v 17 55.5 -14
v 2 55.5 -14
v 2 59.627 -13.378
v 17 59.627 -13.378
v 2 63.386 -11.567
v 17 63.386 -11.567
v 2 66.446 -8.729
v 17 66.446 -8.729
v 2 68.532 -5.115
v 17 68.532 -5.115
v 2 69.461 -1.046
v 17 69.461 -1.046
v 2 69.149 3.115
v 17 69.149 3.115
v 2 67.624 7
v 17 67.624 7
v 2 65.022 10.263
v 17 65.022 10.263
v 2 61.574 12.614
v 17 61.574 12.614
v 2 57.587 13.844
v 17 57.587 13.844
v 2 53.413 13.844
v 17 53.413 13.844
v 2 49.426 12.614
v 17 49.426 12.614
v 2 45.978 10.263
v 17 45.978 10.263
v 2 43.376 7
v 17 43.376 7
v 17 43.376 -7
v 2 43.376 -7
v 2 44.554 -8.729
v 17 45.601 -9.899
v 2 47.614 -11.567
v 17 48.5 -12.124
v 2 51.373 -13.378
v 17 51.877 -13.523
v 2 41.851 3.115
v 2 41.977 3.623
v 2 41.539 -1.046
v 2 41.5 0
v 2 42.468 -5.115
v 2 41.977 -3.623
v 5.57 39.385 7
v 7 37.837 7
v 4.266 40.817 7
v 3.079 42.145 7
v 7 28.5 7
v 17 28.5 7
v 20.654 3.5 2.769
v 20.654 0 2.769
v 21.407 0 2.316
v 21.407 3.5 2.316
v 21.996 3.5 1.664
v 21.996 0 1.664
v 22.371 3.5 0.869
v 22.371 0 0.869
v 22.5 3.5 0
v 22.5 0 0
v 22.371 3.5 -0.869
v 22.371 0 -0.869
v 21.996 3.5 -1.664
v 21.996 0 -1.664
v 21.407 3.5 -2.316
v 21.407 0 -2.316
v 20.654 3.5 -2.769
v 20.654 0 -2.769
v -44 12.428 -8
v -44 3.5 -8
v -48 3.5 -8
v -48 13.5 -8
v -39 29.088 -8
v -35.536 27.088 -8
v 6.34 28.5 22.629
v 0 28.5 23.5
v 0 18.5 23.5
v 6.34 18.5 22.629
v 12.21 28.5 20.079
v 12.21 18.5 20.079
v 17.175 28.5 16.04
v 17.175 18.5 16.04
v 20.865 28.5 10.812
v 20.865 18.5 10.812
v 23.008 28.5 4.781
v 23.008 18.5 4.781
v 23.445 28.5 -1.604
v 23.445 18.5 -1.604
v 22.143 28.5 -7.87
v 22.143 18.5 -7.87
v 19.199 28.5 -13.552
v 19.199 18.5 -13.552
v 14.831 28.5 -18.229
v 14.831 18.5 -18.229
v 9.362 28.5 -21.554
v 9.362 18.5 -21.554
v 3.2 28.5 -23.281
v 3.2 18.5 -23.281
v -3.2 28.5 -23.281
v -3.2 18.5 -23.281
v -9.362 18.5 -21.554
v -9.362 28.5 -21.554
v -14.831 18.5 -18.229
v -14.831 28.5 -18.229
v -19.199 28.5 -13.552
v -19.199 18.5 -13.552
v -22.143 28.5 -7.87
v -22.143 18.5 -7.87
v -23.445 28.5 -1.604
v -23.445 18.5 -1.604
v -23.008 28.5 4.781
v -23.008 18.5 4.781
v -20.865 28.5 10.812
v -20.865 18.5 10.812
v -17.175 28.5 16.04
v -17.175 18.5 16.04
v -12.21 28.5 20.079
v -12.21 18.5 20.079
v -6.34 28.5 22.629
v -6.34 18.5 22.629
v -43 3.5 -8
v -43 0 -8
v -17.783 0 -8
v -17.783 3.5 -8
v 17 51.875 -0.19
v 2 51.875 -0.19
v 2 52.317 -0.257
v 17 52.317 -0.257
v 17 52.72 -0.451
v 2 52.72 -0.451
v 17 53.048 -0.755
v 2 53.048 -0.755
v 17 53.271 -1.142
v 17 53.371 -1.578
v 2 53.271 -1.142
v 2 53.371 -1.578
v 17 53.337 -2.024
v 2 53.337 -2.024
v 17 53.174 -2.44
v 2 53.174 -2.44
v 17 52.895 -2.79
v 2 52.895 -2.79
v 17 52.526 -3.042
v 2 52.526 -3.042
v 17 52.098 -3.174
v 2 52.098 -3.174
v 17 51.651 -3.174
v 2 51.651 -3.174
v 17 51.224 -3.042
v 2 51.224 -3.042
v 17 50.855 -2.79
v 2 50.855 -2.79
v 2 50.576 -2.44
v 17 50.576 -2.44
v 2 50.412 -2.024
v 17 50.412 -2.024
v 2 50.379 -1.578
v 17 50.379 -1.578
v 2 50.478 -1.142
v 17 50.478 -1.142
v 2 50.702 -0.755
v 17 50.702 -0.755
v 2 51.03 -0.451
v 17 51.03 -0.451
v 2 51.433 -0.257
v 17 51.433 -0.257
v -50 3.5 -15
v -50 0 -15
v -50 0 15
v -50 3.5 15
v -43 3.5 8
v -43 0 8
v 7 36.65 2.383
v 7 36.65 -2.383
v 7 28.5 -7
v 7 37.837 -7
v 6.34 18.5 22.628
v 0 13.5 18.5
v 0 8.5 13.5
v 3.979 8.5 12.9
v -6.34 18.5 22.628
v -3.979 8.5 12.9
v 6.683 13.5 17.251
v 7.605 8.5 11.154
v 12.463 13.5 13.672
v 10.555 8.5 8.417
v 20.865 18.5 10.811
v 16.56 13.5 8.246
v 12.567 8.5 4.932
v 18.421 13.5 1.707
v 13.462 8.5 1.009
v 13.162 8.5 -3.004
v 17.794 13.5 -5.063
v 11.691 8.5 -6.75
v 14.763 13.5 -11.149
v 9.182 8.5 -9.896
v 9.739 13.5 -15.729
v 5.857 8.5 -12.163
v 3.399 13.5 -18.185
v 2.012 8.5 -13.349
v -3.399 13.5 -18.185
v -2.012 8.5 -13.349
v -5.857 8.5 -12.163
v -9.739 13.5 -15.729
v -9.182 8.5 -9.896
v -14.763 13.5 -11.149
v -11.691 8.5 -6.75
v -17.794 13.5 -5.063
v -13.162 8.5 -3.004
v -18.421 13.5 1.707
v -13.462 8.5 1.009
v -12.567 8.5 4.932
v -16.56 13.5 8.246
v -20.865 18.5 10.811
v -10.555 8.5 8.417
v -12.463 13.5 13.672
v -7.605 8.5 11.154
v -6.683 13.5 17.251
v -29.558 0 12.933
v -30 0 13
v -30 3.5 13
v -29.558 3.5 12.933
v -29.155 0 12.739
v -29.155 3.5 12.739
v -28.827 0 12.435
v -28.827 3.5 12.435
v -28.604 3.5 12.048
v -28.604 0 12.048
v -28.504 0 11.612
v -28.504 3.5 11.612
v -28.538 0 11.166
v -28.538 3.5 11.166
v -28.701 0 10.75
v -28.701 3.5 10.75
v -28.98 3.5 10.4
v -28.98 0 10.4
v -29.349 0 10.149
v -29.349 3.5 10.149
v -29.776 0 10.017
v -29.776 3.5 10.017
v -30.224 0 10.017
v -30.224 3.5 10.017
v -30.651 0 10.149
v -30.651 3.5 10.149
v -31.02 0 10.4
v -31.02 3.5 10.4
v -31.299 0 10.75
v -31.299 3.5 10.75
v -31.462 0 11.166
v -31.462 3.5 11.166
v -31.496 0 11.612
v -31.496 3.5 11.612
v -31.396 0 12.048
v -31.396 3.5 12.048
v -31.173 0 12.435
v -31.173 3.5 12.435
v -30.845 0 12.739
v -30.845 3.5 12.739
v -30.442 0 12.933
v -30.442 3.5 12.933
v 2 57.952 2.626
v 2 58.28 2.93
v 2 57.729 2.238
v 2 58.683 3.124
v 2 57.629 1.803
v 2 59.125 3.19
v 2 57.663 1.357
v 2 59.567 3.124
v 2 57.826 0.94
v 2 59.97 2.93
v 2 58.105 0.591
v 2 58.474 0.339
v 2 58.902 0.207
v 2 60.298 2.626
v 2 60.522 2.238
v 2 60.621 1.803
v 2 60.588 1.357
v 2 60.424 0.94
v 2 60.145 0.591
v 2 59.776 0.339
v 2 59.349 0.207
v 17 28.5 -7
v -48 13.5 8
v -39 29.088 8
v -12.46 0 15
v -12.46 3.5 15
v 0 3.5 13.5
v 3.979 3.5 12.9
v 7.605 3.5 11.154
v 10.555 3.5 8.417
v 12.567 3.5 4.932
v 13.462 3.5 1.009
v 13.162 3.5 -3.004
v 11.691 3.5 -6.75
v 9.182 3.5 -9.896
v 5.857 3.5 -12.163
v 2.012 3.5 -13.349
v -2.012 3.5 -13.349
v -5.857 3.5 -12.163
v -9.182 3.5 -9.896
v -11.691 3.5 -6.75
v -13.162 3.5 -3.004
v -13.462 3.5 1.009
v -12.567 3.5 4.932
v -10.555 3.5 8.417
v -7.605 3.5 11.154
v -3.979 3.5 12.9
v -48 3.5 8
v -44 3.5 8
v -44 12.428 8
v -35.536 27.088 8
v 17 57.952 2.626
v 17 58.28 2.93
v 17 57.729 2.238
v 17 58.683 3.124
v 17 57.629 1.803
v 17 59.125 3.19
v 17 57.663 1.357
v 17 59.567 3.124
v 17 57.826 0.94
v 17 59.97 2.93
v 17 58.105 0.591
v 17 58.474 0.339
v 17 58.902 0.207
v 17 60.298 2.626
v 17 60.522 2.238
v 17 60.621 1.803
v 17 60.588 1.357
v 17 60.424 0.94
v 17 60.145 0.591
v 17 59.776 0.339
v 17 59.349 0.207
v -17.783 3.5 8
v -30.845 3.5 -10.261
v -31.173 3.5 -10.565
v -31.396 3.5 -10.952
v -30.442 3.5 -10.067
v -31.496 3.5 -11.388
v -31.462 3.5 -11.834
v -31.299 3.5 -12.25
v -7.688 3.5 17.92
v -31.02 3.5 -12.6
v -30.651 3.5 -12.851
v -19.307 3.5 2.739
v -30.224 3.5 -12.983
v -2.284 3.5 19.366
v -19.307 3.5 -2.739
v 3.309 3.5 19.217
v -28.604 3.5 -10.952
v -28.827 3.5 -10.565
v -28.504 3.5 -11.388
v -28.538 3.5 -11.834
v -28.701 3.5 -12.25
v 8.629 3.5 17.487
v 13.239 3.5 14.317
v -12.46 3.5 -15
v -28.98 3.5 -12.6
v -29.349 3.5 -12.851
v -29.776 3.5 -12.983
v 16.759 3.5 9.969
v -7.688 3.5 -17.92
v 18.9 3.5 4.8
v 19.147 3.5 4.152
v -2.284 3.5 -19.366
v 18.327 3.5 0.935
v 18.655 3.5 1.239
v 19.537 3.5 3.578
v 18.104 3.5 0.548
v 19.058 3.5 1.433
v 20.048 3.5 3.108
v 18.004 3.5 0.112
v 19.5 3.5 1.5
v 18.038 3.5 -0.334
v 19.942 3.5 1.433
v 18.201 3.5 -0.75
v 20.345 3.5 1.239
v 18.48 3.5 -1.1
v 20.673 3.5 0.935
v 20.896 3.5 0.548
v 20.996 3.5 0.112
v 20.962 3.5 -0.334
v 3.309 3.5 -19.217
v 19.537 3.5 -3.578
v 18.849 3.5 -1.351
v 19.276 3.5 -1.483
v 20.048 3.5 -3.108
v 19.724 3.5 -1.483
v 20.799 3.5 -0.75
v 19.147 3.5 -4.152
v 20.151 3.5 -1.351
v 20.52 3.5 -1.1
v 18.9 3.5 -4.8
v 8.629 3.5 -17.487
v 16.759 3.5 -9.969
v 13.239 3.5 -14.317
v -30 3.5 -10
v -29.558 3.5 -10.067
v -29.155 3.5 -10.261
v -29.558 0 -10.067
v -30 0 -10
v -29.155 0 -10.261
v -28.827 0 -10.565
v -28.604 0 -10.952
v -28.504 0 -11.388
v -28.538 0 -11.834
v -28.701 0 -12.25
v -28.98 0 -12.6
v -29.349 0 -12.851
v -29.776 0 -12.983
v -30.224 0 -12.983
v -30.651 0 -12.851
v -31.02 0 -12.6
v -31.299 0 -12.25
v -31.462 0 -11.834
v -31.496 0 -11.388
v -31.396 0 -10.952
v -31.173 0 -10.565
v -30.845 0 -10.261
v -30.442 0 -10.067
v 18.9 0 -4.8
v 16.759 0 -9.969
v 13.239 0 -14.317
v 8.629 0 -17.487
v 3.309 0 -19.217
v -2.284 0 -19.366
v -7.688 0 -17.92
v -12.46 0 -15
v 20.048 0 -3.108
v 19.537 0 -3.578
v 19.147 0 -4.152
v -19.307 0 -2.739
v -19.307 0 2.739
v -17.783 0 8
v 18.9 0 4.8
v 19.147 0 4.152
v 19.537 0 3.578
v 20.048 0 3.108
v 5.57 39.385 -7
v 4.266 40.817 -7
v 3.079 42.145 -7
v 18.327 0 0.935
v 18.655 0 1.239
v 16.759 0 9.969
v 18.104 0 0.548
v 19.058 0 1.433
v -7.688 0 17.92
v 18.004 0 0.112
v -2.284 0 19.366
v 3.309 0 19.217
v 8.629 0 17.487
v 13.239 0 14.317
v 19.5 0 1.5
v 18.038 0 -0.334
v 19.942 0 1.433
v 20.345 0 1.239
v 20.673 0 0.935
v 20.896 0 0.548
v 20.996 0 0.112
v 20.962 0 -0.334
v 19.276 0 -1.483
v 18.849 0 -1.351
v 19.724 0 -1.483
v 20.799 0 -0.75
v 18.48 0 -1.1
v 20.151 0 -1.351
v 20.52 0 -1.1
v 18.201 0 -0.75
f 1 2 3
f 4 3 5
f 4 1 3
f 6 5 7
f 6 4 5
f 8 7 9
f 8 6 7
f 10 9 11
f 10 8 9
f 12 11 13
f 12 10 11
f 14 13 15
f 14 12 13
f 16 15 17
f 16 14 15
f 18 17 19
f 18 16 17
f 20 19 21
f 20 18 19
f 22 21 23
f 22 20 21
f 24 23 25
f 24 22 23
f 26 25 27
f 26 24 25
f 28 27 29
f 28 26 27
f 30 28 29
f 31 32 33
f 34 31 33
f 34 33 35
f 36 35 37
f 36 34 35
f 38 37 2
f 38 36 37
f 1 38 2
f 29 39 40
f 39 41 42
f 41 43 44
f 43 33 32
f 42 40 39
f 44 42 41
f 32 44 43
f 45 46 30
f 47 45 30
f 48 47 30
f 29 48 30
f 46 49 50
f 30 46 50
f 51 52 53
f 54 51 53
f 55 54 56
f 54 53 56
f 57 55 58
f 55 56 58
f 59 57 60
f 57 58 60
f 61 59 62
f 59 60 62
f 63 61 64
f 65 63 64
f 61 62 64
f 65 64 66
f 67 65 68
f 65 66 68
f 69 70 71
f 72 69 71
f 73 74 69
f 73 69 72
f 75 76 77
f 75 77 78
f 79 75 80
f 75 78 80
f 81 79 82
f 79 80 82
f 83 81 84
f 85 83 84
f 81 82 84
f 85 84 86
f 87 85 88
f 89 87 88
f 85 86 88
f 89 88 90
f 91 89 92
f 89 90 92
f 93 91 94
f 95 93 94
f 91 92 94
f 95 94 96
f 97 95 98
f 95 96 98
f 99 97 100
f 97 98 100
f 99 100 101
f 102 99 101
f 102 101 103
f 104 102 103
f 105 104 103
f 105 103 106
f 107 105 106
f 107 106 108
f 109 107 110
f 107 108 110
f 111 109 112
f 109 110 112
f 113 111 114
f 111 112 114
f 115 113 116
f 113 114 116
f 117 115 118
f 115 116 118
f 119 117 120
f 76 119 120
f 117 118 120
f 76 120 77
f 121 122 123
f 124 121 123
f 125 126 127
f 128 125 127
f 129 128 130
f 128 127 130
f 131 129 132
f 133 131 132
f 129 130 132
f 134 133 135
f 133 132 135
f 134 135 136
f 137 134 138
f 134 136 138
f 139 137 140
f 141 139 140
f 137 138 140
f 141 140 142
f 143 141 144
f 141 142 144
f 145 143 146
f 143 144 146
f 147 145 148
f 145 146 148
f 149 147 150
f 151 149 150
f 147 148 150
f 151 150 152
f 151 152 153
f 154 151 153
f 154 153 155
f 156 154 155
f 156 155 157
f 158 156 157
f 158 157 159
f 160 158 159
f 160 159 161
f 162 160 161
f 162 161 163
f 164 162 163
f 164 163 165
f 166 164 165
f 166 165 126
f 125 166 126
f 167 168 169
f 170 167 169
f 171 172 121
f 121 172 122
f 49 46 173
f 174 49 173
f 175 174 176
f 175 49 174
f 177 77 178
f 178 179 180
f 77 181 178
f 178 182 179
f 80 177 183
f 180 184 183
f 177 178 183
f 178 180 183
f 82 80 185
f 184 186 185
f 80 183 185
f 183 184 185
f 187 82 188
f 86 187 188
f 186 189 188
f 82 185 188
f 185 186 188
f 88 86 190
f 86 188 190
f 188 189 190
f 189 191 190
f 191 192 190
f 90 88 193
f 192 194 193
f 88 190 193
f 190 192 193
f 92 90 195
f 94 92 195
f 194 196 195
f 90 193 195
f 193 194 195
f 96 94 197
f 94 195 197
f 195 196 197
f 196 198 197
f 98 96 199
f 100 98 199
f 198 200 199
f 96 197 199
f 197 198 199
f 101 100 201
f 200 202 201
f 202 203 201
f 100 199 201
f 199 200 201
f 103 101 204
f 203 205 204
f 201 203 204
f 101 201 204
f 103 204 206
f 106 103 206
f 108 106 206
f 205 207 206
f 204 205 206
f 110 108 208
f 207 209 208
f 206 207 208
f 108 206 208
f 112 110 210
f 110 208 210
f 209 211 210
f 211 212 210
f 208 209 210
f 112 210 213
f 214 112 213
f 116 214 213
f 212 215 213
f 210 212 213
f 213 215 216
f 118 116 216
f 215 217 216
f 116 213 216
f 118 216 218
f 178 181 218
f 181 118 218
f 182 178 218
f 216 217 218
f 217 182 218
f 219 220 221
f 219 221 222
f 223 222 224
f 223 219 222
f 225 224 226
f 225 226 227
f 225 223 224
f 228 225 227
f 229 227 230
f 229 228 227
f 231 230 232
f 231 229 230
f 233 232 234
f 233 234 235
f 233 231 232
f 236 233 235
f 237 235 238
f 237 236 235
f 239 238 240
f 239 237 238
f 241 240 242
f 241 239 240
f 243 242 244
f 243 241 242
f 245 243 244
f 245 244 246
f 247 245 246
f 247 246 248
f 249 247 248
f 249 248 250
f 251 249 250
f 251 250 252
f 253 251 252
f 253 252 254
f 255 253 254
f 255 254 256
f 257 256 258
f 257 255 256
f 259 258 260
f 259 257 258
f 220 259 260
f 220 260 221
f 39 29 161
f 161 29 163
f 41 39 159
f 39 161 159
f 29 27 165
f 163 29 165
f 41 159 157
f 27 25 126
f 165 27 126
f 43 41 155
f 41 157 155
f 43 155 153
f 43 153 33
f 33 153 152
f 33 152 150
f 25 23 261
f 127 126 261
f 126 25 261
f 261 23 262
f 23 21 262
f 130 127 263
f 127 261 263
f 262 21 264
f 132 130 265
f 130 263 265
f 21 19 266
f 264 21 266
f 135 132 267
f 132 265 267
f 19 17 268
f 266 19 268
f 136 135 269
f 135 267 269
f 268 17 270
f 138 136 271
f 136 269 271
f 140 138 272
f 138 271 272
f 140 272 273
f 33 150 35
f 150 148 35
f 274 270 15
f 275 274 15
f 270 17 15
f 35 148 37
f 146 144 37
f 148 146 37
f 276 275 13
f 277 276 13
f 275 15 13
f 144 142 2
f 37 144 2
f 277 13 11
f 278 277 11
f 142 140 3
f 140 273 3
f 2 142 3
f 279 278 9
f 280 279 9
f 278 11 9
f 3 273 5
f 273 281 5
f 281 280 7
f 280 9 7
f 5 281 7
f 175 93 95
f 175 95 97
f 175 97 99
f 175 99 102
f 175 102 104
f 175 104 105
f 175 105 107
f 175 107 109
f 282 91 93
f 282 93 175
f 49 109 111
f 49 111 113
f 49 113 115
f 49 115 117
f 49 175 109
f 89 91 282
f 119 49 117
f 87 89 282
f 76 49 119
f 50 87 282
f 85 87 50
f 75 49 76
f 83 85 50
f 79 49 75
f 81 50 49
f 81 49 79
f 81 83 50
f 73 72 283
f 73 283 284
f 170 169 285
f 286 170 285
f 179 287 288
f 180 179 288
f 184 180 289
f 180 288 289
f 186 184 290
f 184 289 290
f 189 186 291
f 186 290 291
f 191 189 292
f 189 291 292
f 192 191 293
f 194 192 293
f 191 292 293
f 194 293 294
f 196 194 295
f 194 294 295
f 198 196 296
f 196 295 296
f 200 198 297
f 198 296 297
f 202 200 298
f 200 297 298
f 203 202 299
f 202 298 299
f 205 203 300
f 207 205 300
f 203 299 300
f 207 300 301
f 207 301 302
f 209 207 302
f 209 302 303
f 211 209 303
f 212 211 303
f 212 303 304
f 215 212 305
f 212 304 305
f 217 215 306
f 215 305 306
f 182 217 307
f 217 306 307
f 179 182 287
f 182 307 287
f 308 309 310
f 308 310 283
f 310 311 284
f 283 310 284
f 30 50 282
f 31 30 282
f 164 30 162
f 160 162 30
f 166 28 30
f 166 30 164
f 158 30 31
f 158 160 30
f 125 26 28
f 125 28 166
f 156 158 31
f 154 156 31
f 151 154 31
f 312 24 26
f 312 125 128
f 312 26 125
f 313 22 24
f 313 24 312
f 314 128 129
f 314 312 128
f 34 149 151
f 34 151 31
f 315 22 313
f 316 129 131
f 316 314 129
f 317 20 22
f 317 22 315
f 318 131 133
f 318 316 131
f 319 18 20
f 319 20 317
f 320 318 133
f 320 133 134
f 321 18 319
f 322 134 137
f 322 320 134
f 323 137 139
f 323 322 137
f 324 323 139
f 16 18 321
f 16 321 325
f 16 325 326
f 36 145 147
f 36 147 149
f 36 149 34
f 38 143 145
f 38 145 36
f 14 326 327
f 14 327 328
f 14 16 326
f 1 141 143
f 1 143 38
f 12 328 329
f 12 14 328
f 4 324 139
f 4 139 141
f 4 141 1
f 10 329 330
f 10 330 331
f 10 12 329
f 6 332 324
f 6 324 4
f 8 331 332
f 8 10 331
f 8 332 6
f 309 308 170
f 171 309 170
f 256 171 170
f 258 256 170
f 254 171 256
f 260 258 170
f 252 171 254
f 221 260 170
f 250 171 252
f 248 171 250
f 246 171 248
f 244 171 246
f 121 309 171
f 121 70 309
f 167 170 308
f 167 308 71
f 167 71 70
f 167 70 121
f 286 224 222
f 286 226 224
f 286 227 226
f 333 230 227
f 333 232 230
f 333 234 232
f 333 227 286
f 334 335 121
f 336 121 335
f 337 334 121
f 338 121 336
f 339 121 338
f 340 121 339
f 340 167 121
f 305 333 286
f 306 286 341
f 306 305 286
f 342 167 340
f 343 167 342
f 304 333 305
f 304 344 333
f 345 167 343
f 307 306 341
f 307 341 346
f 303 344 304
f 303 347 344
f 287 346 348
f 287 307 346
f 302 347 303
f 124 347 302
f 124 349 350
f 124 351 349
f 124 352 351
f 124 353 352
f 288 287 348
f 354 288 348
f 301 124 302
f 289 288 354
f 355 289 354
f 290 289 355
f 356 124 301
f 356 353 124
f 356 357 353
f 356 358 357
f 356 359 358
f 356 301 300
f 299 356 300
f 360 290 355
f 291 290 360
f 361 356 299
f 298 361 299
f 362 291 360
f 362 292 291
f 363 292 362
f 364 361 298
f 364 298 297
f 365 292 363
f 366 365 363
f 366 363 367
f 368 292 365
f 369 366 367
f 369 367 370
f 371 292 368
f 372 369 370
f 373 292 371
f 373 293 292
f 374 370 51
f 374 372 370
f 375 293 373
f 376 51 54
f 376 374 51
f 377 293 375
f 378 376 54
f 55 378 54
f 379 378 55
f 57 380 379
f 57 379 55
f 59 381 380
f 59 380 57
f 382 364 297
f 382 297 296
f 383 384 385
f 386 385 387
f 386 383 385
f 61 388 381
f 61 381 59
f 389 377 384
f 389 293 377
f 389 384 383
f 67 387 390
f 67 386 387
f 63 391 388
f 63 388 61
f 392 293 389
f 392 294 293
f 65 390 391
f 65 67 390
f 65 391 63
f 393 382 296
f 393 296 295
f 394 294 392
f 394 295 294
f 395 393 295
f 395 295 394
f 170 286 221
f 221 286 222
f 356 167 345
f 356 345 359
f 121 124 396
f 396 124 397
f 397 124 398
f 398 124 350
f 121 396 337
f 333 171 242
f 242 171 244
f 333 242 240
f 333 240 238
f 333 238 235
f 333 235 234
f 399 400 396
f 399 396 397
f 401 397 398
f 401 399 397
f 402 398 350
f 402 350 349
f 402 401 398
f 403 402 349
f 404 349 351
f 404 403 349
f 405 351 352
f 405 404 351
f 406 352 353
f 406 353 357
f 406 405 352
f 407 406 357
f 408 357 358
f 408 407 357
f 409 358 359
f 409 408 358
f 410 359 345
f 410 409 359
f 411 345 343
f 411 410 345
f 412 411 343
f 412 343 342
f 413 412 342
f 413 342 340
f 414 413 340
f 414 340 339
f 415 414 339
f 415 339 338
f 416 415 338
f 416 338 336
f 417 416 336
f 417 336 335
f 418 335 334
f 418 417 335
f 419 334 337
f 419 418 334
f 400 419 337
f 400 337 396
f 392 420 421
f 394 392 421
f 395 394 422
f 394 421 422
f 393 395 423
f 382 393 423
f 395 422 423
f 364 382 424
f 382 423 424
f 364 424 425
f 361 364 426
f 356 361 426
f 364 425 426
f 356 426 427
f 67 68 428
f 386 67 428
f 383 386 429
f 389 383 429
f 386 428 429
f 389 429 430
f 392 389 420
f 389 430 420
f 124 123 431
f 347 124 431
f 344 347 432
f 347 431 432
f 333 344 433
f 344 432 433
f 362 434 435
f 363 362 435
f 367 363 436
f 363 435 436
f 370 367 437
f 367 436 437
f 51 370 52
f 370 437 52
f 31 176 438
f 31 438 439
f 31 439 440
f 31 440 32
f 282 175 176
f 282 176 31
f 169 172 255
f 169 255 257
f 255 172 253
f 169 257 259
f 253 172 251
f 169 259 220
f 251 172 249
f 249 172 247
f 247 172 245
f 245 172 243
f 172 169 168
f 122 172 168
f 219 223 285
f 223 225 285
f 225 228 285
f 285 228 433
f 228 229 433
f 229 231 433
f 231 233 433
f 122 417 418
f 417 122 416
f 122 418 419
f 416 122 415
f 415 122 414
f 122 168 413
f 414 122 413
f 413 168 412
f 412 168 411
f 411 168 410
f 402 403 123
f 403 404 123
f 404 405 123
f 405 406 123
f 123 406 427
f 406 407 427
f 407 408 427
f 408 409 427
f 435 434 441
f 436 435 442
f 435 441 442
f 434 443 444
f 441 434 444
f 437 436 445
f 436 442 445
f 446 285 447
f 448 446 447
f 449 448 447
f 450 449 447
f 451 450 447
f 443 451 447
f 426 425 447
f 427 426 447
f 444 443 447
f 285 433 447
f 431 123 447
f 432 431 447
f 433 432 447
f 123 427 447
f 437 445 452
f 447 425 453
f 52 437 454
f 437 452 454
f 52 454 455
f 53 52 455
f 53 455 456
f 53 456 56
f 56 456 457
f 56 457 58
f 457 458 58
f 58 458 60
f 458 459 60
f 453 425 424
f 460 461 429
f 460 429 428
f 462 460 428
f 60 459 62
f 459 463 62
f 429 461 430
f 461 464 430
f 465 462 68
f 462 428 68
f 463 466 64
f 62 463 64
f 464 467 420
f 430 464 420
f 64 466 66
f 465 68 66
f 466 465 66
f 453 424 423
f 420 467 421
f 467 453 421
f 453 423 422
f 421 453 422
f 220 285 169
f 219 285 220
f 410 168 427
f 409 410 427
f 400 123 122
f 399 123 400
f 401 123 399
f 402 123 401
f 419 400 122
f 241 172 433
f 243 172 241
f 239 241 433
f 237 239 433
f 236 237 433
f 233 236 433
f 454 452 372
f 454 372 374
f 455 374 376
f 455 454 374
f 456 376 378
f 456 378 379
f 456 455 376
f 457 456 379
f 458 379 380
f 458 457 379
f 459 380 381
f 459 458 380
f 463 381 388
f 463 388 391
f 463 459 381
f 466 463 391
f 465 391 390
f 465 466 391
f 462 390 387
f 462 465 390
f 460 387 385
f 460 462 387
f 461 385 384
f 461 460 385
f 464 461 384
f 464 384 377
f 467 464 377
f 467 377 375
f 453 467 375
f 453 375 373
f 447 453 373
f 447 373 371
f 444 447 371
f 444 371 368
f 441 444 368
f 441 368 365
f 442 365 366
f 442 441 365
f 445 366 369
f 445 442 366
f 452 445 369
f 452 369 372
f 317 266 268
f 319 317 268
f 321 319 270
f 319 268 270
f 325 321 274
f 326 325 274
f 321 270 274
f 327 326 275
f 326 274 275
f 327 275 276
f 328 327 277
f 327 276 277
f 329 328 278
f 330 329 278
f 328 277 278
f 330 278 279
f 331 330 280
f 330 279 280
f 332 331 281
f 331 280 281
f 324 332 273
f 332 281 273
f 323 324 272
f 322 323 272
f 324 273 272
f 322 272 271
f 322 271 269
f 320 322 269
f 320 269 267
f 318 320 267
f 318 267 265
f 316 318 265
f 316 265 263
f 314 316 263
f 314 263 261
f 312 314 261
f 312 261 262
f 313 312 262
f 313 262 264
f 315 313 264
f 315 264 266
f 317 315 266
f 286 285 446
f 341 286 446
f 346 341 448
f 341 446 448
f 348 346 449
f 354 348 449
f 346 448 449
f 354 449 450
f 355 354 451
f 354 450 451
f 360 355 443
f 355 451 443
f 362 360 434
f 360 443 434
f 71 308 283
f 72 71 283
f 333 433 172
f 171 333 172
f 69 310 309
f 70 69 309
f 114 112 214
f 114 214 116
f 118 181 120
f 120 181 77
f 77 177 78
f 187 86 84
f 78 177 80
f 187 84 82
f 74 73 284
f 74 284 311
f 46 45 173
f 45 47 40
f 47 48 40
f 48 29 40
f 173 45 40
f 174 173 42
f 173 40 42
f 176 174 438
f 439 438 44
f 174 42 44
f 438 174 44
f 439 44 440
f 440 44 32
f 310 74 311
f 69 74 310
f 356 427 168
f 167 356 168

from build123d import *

# Parameters (mm, degrees)
SKETCH1_R           = 1.5
BOSS_EXTRUDE1_DEPTH = 3.5
BOSS_EXTRUDE2_DEPTH = 16
SKETCH4_R           = 13.5
BOSS_EXTRUDE3_DEPTH = 15
SKETCH5_R           = 23.5
BOSS_EXTRUDE4_DEPTH = 10
SKETCH6_W           = 10
SKETCH6_H           = 14
BOSS_EXTRUDE5_DEPTH = 20
SKETCH7_R           = 14
BOSS_EXTRUDE6_DEPTH = 15
CHAMFER1_SIZE       = 10
CUT_EXTRUDE4_REACH  = 91.925
SKETCH10_R          = 1.5
CHAMFER2_SIZE       = 5


with BuildPart() as part:
    # Sketch1 → Boss-Extrude1 (new body)
    with BuildSketch(Plane(origin=(0, 0, 0), x_dir=(1, 0, 0), z_dir=(0, 1, 0))):
        with BuildLine():
            Line((-50, -15), (-12.459935794, -15))
            ThreePointArc((-12.459935794, -15), (6.031468042, -18.543769661), (18.9, -4.8))
            ThreePointArc((18.9, -4.8), (19.537223284, -3.577601927), (20.653846154, -2.769230769))
            ThreePointArc((20.653846154, -2.769230769), (22.5, 0), (20.653846154, 2.769230769))
            ThreePointArc((20.653846154, 2.769230769), (19.537223284, 3.577601927), (18.9, 4.8))
            ThreePointArc((18.9, 4.8), (6.031468042, 18.543769661), (-12.459935794, 15))
            Line((-12.459935794, 15), (-50, 15))
            Line((-50, 15), (-50, -15))
        make_face()
        with Locations(Location((-30, -11.5, 0), (0, 0, 270))):
            Circle(SKETCH1_R, mode=Mode.SUBTRACT)
        with BuildLine():
            Line((-43, 8), (-17.783419244, 8))
            ThreePointArc((-17.783419244, 8), (-19.5, 0), (-17.783419244, -8))
            Line((-17.783419244, -8), (-43, -8))
            Line((-43, -8), (-43, 8))
        make_face(mode=Mode.SUBTRACT)
        with Locations(Location((-30, 11.5, 0), (0, 0, 270))):
            Circle(SKETCH1_R, mode=Mode.SUBTRACT)
        with Locations(Location((19.5, 0, 0), (0, 0, 270))):
            Circle(SKETCH1_R, mode=Mode.SUBTRACT)
    extrude(amount=BOSS_EXTRUDE1_DEPTH)

    # Sketch2 → Boss-Extrude2 (add)
    with BuildSketch(Plane.XY.offset(-8)):
        Polygon((-48, 3.5), (-48, 13.5), (-39, 29.088457268), (-35.535898385, 27.088457268), (-44, 12.42820323), (-44, 3.5), align=None)
    extrude(amount=BOSS_EXTRUDE2_DEPTH)

    # Sketch4 → Boss-Extrude3 (add)
    with BuildSketch(Plane(origin=(0, 3.5, 0), x_dir=(1, 0, 0), z_dir=(0, 1, 0))):
        with Locations(Location((0, 0, 0), (0, 0, 270))):
            Circle(SKETCH4_R)
    extrude(amount=BOSS_EXTRUDE3_DEPTH)

    # Sketch5 → Boss-Extrude4 (add)
    with BuildSketch(Plane(origin=(0, 18.5, 0), x_dir=(1, 0, 0), z_dir=(0, 1, 0))):
        with Locations(Location((0, 0, 0), (0, 0, 270))):
            Circle(SKETCH5_R)
    extrude(amount=BOSS_EXTRUDE4_DEPTH)

    # Sketch6 → Boss-Extrude5 (add)
    with BuildSketch(Plane(origin=(0, 28.5, 0), x_dir=(1, 0, 0), z_dir=(0, 1, 0))):
        with Locations((12, 0)):
            Rectangle(SKETCH6_W, SKETCH6_H)
    extrude(amount=BOSS_EXTRUDE5_DEPTH)

    # Sketch7 → Boss-Extrude6 (add)
    with BuildSketch(Plane(origin=(17, 0, 0), x_dir=(0, 0, -1), z_dir=(1, 0, 0))):
        with Locations((0, 55.5)):
            Circle(SKETCH7_R)
    extrude(amount=-BOSS_EXTRUDE6_DEPTH)

    # Chamfer1
    chamfer1_edges = [part.edges().sort_by_distance(p)[0] for p in [
        (0, 18.5, -13.5),
    ]]
    chamfer(chamfer1_edges, length=CHAMFER1_SIZE - 0.0001)  # a hair under: the kernel refuses the full size

    # Sketch10 → Cut-Extrude4 (cut, up to next)
    with BuildSketch(Plane.ZY.offset(-2), mode=Mode.PRIVATE) as cut_extrude4_sk1:
        with Locations((1.690473047, 59.125231148)):
            Circle(SKETCH10_R)
    cut_extrude4_tool1 = extrude(cut_extrude4_sk1.sketch, amount=-CUT_EXTRUDE4_REACH, mode=Mode.PRIVATE) & part.part
    # Sketch10 → Cut-Extrude4 (cut, up to next)
    with BuildSketch(Plane.ZY.offset(-2), mode=Mode.PRIVATE) as cut_extrude4_sk2:
        with Locations((-1.690473047, 51.874768852)):
            Circle(SKETCH10_R)
    cut_extrude4_tool2 = extrude(cut_extrude4_sk2.sketch, amount=-CUT_EXTRUDE4_REACH, mode=Mode.PRIVATE) & part.part
    add(cut_extrude4_tool1.solids().sort_by_distance((2, 59.125231, 1.690473))[0], mode=Mode.SUBTRACT)
    add(cut_extrude4_tool2.solids().sort_by_distance((2, 51.874769, -1.690473))[0], mode=Mode.SUBTRACT)

    # Chamfer2
    chamfer2_edges = [part.edges().sort_by_distance(p)[0] for p in [
        (7, 41.5, 0),
    ]]
    chamfer(chamfer2_edges, length=CHAMFER2_SIZE - 0.0001)  # a hair under: the kernel refuses the full size


solid = part.part
